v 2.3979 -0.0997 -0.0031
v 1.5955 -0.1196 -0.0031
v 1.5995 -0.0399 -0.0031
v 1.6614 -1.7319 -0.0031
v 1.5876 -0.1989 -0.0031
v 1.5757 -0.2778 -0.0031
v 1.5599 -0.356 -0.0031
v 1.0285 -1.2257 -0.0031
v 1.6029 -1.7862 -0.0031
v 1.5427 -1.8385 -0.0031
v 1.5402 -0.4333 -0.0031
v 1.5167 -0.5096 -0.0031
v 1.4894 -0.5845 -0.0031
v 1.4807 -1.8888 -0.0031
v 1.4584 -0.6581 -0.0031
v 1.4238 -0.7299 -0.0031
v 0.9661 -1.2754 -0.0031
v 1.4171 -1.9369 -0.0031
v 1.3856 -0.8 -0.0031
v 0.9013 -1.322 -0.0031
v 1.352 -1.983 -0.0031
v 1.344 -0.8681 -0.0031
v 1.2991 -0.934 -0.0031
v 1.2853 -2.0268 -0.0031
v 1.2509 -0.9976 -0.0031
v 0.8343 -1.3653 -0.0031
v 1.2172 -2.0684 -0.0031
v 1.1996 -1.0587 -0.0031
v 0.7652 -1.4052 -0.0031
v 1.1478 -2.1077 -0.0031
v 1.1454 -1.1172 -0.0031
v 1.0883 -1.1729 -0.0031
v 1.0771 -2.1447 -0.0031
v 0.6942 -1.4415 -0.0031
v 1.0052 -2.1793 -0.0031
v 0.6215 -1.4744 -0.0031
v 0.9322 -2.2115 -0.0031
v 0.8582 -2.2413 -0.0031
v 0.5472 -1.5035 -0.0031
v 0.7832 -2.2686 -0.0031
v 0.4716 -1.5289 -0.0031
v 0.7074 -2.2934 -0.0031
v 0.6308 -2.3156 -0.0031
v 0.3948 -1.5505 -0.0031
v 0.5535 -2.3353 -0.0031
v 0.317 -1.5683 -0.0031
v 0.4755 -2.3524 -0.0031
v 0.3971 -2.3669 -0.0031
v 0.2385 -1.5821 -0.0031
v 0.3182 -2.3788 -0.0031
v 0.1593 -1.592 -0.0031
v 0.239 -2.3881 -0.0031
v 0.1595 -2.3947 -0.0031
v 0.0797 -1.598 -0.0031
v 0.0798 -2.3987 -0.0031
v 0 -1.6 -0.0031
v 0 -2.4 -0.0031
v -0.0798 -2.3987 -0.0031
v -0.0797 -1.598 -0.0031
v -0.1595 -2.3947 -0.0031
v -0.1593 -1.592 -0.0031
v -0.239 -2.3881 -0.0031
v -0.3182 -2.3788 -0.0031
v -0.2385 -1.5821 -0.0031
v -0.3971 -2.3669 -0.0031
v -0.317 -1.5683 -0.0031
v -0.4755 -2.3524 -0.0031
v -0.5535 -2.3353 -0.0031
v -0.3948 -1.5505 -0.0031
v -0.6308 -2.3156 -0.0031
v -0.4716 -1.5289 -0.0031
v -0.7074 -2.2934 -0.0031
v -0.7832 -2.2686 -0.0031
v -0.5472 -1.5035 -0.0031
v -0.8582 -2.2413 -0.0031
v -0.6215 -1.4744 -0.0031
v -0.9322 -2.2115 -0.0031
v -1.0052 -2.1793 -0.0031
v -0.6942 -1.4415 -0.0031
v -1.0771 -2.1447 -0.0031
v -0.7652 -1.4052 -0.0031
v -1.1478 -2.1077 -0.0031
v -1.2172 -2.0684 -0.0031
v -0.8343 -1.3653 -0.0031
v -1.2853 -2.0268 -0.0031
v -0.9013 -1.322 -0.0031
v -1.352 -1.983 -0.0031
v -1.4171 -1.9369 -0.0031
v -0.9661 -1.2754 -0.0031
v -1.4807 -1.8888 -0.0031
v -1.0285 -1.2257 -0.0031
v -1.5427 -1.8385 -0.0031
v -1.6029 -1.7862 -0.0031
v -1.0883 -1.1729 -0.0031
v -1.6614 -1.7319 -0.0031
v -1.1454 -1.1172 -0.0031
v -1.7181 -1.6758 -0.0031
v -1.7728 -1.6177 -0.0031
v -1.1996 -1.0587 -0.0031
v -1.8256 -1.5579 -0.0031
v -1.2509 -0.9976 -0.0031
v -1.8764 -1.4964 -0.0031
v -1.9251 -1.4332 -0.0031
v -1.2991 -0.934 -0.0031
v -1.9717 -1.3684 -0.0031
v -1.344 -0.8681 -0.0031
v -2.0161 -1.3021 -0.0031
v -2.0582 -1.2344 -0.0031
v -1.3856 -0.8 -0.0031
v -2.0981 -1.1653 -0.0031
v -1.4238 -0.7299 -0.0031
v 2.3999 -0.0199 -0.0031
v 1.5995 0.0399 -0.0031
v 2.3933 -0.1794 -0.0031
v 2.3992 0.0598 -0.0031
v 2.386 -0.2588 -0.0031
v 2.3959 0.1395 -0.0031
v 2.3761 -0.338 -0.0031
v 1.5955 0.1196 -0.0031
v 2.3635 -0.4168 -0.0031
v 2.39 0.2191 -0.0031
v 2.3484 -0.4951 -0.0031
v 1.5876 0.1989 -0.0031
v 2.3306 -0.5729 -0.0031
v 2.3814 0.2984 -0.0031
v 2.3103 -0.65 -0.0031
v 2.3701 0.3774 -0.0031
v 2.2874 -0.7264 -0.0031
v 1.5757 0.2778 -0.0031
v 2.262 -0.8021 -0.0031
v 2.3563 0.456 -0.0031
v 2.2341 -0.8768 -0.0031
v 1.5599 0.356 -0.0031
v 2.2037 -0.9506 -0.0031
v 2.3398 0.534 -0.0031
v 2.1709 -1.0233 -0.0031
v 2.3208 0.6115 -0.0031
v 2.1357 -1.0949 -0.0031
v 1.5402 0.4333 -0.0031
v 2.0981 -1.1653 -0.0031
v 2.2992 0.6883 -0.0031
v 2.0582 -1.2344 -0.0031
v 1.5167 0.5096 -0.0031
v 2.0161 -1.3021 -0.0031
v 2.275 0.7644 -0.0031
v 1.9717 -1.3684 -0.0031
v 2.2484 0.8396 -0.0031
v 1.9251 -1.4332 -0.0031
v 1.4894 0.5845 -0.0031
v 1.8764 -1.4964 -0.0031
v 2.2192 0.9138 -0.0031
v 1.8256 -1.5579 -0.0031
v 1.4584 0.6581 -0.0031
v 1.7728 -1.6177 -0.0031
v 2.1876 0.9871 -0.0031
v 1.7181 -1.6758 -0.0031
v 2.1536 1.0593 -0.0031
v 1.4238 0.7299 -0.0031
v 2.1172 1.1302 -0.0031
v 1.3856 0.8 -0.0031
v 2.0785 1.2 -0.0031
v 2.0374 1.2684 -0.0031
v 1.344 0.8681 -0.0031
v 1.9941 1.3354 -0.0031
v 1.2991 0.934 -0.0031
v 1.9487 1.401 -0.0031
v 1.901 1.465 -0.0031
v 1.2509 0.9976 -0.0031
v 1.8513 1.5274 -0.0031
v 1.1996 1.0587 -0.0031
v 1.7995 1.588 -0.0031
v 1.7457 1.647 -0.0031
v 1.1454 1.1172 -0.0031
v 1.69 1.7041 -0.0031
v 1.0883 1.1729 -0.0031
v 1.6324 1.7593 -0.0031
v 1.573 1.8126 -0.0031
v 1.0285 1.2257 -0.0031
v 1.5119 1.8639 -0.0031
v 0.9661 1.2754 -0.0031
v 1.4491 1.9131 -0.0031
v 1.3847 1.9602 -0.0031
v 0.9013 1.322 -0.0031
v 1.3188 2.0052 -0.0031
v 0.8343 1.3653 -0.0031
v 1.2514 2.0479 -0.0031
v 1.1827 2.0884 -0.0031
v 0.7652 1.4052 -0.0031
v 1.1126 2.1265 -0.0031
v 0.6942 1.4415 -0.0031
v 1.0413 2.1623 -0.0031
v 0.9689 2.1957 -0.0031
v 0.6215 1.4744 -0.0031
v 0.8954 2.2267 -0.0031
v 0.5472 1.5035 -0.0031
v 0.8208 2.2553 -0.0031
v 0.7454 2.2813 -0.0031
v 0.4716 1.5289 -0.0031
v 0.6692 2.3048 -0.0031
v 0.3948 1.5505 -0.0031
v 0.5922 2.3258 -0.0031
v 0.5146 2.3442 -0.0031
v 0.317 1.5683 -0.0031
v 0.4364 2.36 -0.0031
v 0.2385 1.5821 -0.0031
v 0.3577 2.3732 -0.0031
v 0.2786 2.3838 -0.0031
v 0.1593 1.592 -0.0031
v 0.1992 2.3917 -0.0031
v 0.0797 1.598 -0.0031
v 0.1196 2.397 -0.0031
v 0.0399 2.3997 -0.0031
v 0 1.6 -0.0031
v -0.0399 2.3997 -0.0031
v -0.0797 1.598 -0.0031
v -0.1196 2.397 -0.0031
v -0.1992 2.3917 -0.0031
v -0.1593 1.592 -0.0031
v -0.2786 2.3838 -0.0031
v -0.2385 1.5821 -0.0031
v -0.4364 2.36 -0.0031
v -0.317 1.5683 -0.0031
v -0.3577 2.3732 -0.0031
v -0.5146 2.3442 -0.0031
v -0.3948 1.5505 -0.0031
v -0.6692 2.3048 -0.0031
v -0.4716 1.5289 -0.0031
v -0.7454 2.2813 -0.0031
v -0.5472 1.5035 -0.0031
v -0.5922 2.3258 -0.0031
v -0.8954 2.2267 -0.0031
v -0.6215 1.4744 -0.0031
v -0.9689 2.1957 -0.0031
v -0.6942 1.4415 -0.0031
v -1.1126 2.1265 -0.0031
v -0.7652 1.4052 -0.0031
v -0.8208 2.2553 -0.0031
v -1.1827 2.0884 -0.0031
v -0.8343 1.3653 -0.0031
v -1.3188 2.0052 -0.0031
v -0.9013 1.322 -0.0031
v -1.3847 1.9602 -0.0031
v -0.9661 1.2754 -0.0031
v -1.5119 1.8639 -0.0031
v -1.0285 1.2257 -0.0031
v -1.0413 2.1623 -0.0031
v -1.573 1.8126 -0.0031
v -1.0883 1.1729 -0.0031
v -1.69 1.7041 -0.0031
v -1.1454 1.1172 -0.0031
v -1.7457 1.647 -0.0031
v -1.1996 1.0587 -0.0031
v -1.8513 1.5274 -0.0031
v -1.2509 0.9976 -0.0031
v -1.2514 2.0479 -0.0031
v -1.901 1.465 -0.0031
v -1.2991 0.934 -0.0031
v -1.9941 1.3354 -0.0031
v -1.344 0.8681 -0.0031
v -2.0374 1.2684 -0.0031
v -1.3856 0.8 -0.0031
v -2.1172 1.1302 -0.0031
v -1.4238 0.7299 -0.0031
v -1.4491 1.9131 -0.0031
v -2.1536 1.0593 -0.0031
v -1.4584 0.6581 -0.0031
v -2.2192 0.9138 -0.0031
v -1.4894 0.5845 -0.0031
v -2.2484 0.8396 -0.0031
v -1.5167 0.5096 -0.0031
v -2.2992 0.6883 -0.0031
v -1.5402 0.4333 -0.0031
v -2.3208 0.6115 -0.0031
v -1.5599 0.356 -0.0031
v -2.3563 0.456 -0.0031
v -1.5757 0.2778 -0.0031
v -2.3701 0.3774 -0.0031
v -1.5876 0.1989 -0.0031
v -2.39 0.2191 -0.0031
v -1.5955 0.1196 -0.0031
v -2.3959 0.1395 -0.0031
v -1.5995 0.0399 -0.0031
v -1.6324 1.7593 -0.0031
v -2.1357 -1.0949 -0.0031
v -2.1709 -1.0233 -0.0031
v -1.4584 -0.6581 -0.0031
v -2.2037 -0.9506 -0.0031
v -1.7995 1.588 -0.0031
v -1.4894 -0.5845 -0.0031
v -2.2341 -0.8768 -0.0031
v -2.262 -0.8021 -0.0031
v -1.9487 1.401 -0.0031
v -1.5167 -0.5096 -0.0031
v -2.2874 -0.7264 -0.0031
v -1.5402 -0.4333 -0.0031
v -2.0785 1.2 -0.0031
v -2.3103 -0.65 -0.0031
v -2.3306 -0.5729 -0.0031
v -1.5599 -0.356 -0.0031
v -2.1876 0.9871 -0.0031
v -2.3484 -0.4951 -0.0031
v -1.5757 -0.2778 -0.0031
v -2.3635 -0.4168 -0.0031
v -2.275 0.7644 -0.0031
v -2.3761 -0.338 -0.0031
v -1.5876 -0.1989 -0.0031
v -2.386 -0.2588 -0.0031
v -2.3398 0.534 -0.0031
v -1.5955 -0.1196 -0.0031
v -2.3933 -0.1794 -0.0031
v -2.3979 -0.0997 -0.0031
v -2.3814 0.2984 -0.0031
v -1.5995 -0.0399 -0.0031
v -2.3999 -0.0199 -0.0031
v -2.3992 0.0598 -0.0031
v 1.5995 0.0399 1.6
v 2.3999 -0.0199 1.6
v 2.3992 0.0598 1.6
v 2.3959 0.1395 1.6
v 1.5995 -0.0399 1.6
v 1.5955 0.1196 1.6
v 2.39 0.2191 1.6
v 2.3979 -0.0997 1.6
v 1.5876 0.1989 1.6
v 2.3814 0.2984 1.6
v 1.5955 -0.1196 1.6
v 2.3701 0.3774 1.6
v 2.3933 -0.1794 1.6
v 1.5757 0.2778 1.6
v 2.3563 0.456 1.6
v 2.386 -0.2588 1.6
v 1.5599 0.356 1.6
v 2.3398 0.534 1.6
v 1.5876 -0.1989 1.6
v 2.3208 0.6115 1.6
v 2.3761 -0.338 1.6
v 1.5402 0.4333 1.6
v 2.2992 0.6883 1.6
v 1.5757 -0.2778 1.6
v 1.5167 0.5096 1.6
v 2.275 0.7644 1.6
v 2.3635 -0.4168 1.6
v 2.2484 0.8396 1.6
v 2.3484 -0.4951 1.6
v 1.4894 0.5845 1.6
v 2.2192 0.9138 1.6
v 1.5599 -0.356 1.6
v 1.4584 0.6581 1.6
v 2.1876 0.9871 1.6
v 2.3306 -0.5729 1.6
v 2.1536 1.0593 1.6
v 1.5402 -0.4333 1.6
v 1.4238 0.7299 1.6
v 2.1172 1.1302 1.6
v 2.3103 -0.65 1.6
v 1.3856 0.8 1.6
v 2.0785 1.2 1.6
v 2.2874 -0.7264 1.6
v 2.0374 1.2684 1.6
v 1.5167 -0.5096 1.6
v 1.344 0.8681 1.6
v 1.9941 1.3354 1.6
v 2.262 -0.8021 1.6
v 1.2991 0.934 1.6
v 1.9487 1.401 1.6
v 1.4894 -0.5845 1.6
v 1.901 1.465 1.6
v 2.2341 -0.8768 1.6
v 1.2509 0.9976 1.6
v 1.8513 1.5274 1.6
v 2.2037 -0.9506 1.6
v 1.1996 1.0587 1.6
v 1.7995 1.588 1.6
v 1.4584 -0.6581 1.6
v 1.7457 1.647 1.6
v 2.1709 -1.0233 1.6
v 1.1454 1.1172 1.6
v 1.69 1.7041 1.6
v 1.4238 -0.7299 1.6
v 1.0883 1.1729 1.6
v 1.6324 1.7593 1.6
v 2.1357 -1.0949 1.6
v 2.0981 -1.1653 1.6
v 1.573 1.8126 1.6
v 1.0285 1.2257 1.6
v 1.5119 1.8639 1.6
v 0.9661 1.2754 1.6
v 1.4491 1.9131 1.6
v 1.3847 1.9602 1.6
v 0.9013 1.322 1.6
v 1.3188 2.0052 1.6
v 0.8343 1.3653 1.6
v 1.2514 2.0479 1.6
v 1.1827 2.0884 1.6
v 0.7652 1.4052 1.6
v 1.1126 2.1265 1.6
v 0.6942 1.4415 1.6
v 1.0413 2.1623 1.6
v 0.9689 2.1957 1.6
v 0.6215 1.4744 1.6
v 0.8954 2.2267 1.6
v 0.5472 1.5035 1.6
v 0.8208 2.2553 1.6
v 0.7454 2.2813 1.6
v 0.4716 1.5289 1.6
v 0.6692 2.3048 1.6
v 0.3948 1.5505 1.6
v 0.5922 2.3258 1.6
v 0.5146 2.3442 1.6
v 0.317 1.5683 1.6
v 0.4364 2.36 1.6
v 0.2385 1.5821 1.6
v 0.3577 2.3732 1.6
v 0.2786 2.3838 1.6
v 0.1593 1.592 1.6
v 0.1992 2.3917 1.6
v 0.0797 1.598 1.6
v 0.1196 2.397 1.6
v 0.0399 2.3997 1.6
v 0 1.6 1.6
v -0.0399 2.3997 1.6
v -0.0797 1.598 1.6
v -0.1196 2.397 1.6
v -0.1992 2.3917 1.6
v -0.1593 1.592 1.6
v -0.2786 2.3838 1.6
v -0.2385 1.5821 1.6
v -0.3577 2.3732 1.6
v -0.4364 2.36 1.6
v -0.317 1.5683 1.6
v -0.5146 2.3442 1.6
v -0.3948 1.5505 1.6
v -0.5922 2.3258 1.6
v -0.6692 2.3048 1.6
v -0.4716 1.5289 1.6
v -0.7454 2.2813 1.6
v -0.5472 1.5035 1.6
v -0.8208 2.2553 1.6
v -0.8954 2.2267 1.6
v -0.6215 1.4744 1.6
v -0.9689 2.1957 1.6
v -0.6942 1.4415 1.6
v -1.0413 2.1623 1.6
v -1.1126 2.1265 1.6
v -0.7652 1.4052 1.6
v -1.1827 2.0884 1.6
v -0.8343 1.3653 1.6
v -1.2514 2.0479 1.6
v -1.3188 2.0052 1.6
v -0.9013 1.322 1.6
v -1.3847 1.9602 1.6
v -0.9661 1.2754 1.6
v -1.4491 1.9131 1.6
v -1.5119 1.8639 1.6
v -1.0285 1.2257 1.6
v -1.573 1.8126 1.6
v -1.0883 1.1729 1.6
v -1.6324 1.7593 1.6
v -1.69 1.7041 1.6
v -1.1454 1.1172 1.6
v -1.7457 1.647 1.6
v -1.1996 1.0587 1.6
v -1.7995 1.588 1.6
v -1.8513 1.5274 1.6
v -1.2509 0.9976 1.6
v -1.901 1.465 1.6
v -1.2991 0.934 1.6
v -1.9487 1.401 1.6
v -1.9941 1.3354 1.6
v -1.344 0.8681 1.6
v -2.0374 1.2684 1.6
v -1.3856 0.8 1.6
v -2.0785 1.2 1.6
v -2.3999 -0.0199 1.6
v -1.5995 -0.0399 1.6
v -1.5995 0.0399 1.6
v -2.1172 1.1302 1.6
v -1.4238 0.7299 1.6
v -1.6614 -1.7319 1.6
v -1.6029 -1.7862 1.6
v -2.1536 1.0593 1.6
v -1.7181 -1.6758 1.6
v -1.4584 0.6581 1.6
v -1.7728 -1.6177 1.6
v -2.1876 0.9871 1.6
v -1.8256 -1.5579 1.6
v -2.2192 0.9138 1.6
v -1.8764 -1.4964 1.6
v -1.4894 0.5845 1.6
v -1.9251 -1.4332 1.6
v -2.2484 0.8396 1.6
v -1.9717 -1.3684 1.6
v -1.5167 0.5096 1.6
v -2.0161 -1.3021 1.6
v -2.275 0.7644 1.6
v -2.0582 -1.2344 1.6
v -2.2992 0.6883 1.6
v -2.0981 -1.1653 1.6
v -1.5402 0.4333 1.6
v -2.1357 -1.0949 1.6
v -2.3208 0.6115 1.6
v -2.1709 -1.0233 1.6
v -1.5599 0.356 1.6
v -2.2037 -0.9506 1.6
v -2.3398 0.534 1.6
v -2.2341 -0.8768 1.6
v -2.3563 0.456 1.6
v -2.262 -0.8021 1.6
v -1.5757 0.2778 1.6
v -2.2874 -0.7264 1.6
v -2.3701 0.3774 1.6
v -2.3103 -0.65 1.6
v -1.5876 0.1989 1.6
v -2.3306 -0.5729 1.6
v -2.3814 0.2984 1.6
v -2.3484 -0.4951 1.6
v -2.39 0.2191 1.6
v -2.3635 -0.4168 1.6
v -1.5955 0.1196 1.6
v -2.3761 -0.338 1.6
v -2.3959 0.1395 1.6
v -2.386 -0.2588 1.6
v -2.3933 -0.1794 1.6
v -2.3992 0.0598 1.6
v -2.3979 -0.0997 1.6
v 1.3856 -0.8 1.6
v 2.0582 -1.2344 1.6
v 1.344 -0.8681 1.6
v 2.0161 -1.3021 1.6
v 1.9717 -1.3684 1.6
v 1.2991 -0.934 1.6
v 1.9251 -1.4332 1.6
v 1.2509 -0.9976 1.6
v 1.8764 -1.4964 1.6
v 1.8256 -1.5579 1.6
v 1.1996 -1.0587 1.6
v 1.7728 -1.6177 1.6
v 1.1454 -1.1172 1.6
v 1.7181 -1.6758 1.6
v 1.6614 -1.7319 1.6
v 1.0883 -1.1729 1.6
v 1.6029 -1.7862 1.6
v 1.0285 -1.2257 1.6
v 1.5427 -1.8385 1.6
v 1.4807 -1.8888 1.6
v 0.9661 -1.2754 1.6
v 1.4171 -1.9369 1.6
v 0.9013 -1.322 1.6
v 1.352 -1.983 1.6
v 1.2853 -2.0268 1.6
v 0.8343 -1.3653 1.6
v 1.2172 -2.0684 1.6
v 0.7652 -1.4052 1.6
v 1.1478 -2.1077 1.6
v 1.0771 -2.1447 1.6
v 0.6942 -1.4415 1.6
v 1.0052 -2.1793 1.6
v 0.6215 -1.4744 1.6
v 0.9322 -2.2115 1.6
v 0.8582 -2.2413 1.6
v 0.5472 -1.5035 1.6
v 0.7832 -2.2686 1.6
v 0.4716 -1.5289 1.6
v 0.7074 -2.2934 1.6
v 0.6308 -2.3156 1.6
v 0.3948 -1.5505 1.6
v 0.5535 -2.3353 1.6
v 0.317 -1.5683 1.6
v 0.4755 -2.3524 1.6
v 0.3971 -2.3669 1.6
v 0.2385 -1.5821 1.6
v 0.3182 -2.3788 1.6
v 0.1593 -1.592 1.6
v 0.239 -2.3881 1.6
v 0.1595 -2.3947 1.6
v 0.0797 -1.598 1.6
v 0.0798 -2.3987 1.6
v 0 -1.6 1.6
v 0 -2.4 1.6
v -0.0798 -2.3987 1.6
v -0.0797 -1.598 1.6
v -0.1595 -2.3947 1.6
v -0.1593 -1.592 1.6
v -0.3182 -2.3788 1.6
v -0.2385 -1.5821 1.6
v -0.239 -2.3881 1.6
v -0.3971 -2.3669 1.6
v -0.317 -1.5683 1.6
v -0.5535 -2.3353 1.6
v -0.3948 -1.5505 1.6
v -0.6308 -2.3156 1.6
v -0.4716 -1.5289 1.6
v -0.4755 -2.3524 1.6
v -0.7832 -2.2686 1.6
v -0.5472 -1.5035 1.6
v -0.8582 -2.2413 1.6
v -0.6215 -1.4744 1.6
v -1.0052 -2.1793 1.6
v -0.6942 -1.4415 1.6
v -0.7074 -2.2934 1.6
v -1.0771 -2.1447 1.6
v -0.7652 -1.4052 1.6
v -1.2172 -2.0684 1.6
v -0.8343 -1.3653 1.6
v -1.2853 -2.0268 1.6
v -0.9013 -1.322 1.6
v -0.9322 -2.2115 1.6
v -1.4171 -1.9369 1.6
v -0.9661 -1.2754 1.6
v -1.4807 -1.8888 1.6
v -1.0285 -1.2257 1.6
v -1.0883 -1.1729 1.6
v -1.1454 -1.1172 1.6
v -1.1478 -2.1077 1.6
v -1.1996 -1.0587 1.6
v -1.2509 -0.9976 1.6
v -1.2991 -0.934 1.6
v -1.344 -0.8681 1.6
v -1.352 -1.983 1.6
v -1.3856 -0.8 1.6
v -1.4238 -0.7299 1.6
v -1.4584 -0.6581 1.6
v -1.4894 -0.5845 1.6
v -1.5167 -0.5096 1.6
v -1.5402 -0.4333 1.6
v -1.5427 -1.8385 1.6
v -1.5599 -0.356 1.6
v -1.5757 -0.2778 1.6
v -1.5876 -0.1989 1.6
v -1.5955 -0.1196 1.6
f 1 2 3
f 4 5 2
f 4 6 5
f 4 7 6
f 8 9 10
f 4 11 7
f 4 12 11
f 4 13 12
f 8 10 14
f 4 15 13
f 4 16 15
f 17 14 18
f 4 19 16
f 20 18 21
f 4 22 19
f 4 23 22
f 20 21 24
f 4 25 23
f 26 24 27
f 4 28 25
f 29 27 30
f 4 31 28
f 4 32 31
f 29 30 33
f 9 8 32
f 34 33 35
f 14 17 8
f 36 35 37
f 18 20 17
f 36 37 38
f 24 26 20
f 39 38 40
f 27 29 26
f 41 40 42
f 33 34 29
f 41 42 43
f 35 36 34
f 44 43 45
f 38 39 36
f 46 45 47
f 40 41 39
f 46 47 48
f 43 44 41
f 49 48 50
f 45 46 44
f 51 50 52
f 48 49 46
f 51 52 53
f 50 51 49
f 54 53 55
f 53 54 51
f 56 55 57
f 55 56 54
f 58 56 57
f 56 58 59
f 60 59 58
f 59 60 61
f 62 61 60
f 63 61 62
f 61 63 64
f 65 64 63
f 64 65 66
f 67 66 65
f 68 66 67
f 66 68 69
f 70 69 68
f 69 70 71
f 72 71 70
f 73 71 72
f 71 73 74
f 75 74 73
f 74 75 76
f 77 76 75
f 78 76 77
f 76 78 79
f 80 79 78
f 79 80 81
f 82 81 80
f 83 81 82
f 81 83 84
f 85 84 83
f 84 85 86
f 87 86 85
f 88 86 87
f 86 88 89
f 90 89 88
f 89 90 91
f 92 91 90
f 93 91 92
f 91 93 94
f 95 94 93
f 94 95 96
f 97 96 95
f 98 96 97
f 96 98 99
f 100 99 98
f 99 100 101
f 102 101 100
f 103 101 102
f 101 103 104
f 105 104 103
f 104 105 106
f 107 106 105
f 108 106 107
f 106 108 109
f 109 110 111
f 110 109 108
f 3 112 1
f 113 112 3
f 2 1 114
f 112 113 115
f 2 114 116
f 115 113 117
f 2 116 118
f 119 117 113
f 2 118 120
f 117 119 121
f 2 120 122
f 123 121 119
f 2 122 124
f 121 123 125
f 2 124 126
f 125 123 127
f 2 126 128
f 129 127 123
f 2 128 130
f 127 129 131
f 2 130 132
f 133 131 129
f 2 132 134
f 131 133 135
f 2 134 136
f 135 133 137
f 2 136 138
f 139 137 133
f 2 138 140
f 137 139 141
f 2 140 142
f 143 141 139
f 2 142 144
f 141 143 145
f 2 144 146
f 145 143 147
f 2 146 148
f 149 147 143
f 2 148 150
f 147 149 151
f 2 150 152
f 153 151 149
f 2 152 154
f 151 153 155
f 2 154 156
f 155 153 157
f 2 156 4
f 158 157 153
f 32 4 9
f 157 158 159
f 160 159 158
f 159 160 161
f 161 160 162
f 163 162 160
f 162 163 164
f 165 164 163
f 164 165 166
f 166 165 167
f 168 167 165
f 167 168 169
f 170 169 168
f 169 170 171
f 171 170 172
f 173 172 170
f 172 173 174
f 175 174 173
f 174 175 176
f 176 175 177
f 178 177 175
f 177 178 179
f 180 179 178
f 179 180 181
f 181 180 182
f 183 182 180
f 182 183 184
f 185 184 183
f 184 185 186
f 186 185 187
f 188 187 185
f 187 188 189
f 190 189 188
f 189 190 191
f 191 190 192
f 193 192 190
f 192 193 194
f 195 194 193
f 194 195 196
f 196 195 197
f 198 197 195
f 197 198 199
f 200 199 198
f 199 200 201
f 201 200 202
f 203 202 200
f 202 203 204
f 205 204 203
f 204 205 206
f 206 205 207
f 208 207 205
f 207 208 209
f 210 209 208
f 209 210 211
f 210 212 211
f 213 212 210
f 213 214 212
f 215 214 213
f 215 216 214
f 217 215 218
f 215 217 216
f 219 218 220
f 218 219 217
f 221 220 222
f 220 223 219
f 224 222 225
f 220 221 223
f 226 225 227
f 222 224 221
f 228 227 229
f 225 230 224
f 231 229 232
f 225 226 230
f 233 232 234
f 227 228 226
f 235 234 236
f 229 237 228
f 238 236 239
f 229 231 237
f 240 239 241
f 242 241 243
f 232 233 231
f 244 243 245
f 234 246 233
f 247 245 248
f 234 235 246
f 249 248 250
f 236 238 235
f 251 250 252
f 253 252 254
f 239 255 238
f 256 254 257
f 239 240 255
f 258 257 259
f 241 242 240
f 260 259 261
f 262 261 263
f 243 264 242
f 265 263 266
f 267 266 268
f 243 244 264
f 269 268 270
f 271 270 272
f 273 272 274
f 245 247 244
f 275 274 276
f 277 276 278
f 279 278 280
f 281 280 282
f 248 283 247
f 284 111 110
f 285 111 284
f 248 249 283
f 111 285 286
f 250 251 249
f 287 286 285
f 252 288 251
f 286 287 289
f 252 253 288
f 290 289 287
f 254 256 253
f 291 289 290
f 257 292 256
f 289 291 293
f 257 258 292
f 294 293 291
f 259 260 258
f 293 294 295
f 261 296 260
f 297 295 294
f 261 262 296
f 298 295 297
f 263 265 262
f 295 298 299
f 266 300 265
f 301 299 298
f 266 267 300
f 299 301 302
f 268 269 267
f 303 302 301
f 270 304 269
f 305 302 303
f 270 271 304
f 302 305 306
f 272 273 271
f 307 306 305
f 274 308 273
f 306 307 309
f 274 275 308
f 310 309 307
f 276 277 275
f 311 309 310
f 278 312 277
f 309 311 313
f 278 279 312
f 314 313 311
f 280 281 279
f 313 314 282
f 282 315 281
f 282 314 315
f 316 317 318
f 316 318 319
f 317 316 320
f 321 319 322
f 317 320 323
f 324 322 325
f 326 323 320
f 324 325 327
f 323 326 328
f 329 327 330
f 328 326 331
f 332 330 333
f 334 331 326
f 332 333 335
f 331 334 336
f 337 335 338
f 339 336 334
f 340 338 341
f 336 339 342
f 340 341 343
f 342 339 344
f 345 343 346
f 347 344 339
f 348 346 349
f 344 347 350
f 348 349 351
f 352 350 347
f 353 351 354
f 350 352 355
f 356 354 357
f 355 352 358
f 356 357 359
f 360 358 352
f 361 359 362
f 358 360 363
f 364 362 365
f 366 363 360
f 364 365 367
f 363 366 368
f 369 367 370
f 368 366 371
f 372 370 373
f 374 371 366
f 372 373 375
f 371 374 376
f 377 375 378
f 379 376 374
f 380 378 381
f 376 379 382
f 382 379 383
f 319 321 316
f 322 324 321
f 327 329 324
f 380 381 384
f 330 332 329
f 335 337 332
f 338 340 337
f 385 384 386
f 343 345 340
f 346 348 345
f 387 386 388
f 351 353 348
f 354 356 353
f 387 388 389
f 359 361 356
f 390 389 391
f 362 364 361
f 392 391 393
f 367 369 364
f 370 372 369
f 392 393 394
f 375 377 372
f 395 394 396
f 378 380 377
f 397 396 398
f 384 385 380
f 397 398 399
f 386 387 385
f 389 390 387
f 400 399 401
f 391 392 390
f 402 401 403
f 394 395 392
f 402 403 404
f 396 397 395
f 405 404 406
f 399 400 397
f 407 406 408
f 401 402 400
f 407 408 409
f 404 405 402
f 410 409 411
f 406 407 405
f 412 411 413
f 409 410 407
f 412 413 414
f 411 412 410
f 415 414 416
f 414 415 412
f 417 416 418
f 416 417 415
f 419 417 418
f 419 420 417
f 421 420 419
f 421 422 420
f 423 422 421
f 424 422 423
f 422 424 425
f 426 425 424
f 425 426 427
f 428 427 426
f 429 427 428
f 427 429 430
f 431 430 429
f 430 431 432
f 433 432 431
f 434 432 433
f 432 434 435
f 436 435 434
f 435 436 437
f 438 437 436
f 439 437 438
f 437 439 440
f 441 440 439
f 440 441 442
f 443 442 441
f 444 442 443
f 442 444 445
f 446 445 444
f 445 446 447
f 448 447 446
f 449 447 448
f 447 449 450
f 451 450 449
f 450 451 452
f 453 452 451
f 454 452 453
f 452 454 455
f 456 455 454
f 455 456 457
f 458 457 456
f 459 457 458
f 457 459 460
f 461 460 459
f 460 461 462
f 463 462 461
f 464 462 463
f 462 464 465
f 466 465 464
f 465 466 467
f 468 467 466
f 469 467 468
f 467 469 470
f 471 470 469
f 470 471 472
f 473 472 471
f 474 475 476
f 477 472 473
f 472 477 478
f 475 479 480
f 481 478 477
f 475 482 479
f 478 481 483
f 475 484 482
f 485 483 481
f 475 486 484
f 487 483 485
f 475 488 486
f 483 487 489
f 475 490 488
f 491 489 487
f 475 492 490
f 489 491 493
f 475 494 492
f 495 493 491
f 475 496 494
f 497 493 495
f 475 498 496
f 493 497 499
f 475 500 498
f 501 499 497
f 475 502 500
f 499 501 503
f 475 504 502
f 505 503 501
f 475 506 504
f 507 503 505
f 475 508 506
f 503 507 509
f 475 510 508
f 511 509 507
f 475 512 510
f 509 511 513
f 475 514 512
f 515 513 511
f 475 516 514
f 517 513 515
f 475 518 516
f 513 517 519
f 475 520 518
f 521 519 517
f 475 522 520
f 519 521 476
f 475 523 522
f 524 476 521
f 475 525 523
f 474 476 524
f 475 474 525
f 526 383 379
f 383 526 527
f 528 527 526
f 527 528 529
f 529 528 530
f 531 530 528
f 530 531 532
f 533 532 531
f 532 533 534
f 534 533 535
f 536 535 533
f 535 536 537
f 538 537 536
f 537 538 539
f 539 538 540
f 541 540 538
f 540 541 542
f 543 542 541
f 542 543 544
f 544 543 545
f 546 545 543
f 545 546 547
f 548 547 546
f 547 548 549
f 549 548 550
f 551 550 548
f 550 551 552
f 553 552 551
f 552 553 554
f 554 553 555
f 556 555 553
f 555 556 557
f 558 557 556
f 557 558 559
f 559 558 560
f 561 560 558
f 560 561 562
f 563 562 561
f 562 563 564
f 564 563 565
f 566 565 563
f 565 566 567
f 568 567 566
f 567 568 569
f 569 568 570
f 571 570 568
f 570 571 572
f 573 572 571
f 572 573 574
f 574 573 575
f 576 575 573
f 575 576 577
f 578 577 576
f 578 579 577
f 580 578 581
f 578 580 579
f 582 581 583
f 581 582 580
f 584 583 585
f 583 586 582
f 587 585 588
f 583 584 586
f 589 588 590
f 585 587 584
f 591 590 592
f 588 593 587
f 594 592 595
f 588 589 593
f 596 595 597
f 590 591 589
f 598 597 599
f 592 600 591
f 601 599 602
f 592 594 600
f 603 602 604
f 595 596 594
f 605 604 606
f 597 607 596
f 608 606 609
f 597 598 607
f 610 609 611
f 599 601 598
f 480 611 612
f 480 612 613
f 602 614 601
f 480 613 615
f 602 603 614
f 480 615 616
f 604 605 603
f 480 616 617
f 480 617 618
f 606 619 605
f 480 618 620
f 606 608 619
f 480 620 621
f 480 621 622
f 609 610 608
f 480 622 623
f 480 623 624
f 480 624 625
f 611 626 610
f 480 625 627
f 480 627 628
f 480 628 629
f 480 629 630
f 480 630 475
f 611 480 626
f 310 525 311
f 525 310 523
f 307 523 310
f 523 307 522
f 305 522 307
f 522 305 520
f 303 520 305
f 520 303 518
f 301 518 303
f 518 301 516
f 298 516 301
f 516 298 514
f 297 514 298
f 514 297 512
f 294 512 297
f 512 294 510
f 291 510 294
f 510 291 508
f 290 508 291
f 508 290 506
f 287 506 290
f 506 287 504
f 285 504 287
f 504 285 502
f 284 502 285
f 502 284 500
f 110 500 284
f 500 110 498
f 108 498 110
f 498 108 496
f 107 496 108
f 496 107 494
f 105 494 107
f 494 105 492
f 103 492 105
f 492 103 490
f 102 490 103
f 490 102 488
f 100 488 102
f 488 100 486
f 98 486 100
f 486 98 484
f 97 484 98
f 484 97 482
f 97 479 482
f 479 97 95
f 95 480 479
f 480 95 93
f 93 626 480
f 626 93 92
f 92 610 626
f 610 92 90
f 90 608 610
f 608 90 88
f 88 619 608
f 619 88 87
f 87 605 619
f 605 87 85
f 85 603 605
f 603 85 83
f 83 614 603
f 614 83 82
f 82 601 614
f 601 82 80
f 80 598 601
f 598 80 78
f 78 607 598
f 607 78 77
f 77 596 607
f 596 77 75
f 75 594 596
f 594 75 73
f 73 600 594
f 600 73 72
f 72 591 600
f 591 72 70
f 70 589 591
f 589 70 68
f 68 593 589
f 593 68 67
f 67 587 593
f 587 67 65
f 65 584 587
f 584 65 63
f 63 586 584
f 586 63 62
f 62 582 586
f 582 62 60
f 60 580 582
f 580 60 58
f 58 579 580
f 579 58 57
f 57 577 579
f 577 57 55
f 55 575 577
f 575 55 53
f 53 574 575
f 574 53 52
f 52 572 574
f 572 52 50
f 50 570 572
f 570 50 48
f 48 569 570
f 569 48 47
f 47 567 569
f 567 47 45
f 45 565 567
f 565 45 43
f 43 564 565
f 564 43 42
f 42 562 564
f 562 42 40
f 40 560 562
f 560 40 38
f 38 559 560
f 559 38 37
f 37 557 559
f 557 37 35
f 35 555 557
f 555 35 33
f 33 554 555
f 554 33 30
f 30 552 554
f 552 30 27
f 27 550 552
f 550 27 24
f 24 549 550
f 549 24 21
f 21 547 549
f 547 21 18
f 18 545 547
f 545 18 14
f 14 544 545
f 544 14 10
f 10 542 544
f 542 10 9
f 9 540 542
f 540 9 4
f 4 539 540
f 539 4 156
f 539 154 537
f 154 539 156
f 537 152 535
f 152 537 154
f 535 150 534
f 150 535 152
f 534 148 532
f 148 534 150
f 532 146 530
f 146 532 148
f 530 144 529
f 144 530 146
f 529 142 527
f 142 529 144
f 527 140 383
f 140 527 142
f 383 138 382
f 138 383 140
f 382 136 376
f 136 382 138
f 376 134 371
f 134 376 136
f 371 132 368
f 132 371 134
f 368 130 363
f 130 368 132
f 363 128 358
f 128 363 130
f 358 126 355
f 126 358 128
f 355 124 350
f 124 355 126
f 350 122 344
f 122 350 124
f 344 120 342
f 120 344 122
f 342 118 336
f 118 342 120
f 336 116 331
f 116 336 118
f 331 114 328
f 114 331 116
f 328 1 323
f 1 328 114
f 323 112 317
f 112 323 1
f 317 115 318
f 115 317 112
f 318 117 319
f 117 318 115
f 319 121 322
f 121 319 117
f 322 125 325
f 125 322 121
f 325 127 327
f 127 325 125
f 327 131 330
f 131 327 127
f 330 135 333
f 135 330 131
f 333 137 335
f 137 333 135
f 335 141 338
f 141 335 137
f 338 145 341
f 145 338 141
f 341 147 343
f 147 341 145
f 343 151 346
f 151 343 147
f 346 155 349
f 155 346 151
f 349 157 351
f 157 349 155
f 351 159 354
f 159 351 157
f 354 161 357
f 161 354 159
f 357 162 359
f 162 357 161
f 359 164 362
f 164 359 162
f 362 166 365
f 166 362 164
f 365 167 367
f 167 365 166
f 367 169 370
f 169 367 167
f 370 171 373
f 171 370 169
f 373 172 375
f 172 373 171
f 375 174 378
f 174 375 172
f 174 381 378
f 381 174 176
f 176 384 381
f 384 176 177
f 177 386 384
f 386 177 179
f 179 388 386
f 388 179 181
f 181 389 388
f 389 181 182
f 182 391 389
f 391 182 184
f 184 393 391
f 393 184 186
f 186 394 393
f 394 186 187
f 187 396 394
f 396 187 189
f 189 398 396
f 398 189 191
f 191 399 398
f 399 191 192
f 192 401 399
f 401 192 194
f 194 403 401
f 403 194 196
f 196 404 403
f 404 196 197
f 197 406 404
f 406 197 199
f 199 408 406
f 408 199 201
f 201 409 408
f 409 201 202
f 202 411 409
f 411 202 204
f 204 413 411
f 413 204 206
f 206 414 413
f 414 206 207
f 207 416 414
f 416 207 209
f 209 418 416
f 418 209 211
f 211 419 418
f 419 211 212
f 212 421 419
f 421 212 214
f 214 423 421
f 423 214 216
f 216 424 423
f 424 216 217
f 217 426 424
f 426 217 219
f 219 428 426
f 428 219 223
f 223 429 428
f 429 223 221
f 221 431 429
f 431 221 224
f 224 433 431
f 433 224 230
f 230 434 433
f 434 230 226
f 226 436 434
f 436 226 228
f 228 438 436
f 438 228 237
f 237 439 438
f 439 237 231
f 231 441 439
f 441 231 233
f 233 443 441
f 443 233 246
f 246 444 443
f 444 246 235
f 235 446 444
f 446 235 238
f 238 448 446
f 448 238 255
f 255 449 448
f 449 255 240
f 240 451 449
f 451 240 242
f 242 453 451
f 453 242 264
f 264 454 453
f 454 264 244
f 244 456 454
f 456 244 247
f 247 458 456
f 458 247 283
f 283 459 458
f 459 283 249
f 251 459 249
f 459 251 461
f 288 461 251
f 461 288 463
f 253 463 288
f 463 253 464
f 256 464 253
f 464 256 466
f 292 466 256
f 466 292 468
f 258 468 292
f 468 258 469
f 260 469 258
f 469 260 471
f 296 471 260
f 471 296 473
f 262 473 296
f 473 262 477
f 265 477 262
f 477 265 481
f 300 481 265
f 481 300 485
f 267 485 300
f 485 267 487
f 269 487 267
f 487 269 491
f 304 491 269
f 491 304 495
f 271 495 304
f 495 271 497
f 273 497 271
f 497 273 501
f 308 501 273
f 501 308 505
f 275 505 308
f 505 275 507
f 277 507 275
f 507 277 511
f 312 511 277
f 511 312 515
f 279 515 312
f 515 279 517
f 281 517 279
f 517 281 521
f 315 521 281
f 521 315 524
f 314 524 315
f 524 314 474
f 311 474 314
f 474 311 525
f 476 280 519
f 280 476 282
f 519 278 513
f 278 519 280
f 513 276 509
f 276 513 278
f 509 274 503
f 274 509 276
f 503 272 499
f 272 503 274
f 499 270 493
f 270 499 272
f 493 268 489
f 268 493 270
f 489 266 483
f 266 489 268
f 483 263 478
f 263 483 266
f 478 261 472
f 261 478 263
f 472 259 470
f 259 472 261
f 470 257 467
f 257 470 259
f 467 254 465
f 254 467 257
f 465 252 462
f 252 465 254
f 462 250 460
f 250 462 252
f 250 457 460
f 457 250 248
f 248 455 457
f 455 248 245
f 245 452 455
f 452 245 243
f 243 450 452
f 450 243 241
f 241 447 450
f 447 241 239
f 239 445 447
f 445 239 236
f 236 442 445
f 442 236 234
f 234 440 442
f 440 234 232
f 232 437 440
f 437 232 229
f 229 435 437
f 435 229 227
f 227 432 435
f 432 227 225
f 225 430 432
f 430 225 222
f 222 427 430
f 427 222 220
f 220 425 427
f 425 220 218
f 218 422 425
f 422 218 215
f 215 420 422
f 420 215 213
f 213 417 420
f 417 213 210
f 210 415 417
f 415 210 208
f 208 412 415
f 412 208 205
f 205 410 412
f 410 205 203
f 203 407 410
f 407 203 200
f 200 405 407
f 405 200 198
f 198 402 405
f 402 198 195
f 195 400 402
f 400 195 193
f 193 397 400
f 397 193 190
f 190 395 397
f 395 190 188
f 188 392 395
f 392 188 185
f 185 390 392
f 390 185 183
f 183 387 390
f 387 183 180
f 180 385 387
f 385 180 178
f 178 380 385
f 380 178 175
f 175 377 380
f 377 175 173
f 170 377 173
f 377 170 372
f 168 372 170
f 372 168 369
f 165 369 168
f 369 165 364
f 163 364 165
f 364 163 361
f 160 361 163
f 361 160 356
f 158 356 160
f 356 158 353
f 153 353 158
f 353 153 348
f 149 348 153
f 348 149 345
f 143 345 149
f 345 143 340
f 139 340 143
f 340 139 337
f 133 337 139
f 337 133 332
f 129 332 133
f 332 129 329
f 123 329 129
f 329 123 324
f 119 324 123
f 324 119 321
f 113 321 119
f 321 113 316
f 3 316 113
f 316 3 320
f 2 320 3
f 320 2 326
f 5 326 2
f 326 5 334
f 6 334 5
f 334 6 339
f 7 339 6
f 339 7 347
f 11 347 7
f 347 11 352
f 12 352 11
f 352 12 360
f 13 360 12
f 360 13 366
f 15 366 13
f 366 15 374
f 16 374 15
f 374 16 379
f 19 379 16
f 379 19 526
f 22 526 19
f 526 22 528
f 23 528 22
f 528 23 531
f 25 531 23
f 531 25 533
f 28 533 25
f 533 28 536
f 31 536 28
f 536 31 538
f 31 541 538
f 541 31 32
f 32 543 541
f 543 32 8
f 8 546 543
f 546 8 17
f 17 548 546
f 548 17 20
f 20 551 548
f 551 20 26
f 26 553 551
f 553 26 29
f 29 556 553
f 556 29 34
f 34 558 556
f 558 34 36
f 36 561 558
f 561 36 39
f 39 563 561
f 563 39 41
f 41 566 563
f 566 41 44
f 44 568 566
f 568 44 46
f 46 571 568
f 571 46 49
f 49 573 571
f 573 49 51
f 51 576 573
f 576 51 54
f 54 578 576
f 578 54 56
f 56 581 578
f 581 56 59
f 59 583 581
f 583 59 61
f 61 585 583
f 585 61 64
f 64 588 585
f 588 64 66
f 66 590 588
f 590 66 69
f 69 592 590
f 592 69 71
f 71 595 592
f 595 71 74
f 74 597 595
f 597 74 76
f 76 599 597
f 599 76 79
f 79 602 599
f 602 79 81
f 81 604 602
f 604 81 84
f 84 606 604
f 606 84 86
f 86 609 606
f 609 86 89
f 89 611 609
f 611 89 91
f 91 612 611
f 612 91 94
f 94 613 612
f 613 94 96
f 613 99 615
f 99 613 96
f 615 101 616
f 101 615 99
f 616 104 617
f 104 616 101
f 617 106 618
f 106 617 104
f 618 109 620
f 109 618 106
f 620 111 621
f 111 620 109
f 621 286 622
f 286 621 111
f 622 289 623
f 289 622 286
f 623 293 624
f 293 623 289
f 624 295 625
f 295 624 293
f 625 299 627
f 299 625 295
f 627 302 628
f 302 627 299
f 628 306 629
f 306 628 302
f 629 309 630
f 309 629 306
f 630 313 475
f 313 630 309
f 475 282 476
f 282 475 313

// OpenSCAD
use <../lib.scad>
use <s/4181s01.scad>
use <s/4181s02.scad>
use <../p/stud2.scad>
$fa=1; $fs=0.2;
function ldraw_lib__4182p04(realsolid=false) = [
// 0 Train Door  1 x  4 x  5 Right with Red/White/Blue Stripe Pattern
// 0 Name: 4182p04.dat
// 0 Author: James Jessiman
// 0 !LDRAW_ORG Part UPDATE 2009-02
// 0 !LICENSE Licensed under CC BY 2.0 and CC BY 4.0 : see CAreadme.txt
// 
// 0 BFC CERTIFY CCW
  [0,"BFC","CERTIFY"],
  [0,"BFC","CCW"],
// 
// 0 !HISTORY 1998-09-15 [PTadmin] Official Update 1998-08
// 0 !HISTORY 2007-07-04 [PTadmin] Header formatted for Contributor Agreement
// 0 !HISTORY 2008-07-01 [PTadmin] Official Update 2008-01
// 0 !HISTORY 2008-07-07 [WilliamH] BFCed; sub-parted (2006-09-12)
// 0 !HISTORY 2009-09-03 [PTadmin] Official Update 2009-02
// 
// 
// 1 16 0 0 0 1 0 0 0 1 0 0 0 1 stud2.dat
  [1,16,0,0,0,1,0,0,0,1,0,0,0,1, ldraw_lib__stud2(realsolid)],
// 1 16 0 0 0 -1 0 0 0 1 0 0 0 1 s\4181s01.dat
  [1,16,0,0,0,-1,0,0,0,1,0,0,0,1, ldraw_lib__s__4181s01(realsolid)],
// 1 4 0 72 0 -1 0 0 0 1 0 0 0 1 s\4181s02.dat
  [1,4,0,72,0,-1,0,0,0,1,0,0,0,1, ldraw_lib__s__4181s02(realsolid)],
// 1 15 0 80 0 -1 0 0 0 1 0 0 0 1 s\4181s02.dat
  [1,15,0,80,0,-1,0,0,0,1,0,0,0,1, ldraw_lib__s__4181s02(realsolid)],
// 1 1 0 88 0 -1 0 0 0 1 0 0 0 1 s\4181s02.dat
  [1,1,0,88,0,-1,0,0,0,1,0,0,0,1, ldraw_lib__s__4181s02(realsolid)],
// 1 16 0 96 0 -1 0 0 0 3 0 0 0 1 s\4181s02.dat
  [1,16,0,96,0,-1,0,0,0,3,0,0,0,1, ldraw_lib__s__4181s02(realsolid)],
// 0
];
module ldraw_lib__4182p04(step=0, col=false, unit=2/5, alt=false, line=0.2, solid=!$preview)
    makepoly(ldraw_lib__4182p04(solid), step=step, col=col, unit=unit, alt=alt, line=line, solid=solid);
ldraw_lib__4182p04(line=0.2);
